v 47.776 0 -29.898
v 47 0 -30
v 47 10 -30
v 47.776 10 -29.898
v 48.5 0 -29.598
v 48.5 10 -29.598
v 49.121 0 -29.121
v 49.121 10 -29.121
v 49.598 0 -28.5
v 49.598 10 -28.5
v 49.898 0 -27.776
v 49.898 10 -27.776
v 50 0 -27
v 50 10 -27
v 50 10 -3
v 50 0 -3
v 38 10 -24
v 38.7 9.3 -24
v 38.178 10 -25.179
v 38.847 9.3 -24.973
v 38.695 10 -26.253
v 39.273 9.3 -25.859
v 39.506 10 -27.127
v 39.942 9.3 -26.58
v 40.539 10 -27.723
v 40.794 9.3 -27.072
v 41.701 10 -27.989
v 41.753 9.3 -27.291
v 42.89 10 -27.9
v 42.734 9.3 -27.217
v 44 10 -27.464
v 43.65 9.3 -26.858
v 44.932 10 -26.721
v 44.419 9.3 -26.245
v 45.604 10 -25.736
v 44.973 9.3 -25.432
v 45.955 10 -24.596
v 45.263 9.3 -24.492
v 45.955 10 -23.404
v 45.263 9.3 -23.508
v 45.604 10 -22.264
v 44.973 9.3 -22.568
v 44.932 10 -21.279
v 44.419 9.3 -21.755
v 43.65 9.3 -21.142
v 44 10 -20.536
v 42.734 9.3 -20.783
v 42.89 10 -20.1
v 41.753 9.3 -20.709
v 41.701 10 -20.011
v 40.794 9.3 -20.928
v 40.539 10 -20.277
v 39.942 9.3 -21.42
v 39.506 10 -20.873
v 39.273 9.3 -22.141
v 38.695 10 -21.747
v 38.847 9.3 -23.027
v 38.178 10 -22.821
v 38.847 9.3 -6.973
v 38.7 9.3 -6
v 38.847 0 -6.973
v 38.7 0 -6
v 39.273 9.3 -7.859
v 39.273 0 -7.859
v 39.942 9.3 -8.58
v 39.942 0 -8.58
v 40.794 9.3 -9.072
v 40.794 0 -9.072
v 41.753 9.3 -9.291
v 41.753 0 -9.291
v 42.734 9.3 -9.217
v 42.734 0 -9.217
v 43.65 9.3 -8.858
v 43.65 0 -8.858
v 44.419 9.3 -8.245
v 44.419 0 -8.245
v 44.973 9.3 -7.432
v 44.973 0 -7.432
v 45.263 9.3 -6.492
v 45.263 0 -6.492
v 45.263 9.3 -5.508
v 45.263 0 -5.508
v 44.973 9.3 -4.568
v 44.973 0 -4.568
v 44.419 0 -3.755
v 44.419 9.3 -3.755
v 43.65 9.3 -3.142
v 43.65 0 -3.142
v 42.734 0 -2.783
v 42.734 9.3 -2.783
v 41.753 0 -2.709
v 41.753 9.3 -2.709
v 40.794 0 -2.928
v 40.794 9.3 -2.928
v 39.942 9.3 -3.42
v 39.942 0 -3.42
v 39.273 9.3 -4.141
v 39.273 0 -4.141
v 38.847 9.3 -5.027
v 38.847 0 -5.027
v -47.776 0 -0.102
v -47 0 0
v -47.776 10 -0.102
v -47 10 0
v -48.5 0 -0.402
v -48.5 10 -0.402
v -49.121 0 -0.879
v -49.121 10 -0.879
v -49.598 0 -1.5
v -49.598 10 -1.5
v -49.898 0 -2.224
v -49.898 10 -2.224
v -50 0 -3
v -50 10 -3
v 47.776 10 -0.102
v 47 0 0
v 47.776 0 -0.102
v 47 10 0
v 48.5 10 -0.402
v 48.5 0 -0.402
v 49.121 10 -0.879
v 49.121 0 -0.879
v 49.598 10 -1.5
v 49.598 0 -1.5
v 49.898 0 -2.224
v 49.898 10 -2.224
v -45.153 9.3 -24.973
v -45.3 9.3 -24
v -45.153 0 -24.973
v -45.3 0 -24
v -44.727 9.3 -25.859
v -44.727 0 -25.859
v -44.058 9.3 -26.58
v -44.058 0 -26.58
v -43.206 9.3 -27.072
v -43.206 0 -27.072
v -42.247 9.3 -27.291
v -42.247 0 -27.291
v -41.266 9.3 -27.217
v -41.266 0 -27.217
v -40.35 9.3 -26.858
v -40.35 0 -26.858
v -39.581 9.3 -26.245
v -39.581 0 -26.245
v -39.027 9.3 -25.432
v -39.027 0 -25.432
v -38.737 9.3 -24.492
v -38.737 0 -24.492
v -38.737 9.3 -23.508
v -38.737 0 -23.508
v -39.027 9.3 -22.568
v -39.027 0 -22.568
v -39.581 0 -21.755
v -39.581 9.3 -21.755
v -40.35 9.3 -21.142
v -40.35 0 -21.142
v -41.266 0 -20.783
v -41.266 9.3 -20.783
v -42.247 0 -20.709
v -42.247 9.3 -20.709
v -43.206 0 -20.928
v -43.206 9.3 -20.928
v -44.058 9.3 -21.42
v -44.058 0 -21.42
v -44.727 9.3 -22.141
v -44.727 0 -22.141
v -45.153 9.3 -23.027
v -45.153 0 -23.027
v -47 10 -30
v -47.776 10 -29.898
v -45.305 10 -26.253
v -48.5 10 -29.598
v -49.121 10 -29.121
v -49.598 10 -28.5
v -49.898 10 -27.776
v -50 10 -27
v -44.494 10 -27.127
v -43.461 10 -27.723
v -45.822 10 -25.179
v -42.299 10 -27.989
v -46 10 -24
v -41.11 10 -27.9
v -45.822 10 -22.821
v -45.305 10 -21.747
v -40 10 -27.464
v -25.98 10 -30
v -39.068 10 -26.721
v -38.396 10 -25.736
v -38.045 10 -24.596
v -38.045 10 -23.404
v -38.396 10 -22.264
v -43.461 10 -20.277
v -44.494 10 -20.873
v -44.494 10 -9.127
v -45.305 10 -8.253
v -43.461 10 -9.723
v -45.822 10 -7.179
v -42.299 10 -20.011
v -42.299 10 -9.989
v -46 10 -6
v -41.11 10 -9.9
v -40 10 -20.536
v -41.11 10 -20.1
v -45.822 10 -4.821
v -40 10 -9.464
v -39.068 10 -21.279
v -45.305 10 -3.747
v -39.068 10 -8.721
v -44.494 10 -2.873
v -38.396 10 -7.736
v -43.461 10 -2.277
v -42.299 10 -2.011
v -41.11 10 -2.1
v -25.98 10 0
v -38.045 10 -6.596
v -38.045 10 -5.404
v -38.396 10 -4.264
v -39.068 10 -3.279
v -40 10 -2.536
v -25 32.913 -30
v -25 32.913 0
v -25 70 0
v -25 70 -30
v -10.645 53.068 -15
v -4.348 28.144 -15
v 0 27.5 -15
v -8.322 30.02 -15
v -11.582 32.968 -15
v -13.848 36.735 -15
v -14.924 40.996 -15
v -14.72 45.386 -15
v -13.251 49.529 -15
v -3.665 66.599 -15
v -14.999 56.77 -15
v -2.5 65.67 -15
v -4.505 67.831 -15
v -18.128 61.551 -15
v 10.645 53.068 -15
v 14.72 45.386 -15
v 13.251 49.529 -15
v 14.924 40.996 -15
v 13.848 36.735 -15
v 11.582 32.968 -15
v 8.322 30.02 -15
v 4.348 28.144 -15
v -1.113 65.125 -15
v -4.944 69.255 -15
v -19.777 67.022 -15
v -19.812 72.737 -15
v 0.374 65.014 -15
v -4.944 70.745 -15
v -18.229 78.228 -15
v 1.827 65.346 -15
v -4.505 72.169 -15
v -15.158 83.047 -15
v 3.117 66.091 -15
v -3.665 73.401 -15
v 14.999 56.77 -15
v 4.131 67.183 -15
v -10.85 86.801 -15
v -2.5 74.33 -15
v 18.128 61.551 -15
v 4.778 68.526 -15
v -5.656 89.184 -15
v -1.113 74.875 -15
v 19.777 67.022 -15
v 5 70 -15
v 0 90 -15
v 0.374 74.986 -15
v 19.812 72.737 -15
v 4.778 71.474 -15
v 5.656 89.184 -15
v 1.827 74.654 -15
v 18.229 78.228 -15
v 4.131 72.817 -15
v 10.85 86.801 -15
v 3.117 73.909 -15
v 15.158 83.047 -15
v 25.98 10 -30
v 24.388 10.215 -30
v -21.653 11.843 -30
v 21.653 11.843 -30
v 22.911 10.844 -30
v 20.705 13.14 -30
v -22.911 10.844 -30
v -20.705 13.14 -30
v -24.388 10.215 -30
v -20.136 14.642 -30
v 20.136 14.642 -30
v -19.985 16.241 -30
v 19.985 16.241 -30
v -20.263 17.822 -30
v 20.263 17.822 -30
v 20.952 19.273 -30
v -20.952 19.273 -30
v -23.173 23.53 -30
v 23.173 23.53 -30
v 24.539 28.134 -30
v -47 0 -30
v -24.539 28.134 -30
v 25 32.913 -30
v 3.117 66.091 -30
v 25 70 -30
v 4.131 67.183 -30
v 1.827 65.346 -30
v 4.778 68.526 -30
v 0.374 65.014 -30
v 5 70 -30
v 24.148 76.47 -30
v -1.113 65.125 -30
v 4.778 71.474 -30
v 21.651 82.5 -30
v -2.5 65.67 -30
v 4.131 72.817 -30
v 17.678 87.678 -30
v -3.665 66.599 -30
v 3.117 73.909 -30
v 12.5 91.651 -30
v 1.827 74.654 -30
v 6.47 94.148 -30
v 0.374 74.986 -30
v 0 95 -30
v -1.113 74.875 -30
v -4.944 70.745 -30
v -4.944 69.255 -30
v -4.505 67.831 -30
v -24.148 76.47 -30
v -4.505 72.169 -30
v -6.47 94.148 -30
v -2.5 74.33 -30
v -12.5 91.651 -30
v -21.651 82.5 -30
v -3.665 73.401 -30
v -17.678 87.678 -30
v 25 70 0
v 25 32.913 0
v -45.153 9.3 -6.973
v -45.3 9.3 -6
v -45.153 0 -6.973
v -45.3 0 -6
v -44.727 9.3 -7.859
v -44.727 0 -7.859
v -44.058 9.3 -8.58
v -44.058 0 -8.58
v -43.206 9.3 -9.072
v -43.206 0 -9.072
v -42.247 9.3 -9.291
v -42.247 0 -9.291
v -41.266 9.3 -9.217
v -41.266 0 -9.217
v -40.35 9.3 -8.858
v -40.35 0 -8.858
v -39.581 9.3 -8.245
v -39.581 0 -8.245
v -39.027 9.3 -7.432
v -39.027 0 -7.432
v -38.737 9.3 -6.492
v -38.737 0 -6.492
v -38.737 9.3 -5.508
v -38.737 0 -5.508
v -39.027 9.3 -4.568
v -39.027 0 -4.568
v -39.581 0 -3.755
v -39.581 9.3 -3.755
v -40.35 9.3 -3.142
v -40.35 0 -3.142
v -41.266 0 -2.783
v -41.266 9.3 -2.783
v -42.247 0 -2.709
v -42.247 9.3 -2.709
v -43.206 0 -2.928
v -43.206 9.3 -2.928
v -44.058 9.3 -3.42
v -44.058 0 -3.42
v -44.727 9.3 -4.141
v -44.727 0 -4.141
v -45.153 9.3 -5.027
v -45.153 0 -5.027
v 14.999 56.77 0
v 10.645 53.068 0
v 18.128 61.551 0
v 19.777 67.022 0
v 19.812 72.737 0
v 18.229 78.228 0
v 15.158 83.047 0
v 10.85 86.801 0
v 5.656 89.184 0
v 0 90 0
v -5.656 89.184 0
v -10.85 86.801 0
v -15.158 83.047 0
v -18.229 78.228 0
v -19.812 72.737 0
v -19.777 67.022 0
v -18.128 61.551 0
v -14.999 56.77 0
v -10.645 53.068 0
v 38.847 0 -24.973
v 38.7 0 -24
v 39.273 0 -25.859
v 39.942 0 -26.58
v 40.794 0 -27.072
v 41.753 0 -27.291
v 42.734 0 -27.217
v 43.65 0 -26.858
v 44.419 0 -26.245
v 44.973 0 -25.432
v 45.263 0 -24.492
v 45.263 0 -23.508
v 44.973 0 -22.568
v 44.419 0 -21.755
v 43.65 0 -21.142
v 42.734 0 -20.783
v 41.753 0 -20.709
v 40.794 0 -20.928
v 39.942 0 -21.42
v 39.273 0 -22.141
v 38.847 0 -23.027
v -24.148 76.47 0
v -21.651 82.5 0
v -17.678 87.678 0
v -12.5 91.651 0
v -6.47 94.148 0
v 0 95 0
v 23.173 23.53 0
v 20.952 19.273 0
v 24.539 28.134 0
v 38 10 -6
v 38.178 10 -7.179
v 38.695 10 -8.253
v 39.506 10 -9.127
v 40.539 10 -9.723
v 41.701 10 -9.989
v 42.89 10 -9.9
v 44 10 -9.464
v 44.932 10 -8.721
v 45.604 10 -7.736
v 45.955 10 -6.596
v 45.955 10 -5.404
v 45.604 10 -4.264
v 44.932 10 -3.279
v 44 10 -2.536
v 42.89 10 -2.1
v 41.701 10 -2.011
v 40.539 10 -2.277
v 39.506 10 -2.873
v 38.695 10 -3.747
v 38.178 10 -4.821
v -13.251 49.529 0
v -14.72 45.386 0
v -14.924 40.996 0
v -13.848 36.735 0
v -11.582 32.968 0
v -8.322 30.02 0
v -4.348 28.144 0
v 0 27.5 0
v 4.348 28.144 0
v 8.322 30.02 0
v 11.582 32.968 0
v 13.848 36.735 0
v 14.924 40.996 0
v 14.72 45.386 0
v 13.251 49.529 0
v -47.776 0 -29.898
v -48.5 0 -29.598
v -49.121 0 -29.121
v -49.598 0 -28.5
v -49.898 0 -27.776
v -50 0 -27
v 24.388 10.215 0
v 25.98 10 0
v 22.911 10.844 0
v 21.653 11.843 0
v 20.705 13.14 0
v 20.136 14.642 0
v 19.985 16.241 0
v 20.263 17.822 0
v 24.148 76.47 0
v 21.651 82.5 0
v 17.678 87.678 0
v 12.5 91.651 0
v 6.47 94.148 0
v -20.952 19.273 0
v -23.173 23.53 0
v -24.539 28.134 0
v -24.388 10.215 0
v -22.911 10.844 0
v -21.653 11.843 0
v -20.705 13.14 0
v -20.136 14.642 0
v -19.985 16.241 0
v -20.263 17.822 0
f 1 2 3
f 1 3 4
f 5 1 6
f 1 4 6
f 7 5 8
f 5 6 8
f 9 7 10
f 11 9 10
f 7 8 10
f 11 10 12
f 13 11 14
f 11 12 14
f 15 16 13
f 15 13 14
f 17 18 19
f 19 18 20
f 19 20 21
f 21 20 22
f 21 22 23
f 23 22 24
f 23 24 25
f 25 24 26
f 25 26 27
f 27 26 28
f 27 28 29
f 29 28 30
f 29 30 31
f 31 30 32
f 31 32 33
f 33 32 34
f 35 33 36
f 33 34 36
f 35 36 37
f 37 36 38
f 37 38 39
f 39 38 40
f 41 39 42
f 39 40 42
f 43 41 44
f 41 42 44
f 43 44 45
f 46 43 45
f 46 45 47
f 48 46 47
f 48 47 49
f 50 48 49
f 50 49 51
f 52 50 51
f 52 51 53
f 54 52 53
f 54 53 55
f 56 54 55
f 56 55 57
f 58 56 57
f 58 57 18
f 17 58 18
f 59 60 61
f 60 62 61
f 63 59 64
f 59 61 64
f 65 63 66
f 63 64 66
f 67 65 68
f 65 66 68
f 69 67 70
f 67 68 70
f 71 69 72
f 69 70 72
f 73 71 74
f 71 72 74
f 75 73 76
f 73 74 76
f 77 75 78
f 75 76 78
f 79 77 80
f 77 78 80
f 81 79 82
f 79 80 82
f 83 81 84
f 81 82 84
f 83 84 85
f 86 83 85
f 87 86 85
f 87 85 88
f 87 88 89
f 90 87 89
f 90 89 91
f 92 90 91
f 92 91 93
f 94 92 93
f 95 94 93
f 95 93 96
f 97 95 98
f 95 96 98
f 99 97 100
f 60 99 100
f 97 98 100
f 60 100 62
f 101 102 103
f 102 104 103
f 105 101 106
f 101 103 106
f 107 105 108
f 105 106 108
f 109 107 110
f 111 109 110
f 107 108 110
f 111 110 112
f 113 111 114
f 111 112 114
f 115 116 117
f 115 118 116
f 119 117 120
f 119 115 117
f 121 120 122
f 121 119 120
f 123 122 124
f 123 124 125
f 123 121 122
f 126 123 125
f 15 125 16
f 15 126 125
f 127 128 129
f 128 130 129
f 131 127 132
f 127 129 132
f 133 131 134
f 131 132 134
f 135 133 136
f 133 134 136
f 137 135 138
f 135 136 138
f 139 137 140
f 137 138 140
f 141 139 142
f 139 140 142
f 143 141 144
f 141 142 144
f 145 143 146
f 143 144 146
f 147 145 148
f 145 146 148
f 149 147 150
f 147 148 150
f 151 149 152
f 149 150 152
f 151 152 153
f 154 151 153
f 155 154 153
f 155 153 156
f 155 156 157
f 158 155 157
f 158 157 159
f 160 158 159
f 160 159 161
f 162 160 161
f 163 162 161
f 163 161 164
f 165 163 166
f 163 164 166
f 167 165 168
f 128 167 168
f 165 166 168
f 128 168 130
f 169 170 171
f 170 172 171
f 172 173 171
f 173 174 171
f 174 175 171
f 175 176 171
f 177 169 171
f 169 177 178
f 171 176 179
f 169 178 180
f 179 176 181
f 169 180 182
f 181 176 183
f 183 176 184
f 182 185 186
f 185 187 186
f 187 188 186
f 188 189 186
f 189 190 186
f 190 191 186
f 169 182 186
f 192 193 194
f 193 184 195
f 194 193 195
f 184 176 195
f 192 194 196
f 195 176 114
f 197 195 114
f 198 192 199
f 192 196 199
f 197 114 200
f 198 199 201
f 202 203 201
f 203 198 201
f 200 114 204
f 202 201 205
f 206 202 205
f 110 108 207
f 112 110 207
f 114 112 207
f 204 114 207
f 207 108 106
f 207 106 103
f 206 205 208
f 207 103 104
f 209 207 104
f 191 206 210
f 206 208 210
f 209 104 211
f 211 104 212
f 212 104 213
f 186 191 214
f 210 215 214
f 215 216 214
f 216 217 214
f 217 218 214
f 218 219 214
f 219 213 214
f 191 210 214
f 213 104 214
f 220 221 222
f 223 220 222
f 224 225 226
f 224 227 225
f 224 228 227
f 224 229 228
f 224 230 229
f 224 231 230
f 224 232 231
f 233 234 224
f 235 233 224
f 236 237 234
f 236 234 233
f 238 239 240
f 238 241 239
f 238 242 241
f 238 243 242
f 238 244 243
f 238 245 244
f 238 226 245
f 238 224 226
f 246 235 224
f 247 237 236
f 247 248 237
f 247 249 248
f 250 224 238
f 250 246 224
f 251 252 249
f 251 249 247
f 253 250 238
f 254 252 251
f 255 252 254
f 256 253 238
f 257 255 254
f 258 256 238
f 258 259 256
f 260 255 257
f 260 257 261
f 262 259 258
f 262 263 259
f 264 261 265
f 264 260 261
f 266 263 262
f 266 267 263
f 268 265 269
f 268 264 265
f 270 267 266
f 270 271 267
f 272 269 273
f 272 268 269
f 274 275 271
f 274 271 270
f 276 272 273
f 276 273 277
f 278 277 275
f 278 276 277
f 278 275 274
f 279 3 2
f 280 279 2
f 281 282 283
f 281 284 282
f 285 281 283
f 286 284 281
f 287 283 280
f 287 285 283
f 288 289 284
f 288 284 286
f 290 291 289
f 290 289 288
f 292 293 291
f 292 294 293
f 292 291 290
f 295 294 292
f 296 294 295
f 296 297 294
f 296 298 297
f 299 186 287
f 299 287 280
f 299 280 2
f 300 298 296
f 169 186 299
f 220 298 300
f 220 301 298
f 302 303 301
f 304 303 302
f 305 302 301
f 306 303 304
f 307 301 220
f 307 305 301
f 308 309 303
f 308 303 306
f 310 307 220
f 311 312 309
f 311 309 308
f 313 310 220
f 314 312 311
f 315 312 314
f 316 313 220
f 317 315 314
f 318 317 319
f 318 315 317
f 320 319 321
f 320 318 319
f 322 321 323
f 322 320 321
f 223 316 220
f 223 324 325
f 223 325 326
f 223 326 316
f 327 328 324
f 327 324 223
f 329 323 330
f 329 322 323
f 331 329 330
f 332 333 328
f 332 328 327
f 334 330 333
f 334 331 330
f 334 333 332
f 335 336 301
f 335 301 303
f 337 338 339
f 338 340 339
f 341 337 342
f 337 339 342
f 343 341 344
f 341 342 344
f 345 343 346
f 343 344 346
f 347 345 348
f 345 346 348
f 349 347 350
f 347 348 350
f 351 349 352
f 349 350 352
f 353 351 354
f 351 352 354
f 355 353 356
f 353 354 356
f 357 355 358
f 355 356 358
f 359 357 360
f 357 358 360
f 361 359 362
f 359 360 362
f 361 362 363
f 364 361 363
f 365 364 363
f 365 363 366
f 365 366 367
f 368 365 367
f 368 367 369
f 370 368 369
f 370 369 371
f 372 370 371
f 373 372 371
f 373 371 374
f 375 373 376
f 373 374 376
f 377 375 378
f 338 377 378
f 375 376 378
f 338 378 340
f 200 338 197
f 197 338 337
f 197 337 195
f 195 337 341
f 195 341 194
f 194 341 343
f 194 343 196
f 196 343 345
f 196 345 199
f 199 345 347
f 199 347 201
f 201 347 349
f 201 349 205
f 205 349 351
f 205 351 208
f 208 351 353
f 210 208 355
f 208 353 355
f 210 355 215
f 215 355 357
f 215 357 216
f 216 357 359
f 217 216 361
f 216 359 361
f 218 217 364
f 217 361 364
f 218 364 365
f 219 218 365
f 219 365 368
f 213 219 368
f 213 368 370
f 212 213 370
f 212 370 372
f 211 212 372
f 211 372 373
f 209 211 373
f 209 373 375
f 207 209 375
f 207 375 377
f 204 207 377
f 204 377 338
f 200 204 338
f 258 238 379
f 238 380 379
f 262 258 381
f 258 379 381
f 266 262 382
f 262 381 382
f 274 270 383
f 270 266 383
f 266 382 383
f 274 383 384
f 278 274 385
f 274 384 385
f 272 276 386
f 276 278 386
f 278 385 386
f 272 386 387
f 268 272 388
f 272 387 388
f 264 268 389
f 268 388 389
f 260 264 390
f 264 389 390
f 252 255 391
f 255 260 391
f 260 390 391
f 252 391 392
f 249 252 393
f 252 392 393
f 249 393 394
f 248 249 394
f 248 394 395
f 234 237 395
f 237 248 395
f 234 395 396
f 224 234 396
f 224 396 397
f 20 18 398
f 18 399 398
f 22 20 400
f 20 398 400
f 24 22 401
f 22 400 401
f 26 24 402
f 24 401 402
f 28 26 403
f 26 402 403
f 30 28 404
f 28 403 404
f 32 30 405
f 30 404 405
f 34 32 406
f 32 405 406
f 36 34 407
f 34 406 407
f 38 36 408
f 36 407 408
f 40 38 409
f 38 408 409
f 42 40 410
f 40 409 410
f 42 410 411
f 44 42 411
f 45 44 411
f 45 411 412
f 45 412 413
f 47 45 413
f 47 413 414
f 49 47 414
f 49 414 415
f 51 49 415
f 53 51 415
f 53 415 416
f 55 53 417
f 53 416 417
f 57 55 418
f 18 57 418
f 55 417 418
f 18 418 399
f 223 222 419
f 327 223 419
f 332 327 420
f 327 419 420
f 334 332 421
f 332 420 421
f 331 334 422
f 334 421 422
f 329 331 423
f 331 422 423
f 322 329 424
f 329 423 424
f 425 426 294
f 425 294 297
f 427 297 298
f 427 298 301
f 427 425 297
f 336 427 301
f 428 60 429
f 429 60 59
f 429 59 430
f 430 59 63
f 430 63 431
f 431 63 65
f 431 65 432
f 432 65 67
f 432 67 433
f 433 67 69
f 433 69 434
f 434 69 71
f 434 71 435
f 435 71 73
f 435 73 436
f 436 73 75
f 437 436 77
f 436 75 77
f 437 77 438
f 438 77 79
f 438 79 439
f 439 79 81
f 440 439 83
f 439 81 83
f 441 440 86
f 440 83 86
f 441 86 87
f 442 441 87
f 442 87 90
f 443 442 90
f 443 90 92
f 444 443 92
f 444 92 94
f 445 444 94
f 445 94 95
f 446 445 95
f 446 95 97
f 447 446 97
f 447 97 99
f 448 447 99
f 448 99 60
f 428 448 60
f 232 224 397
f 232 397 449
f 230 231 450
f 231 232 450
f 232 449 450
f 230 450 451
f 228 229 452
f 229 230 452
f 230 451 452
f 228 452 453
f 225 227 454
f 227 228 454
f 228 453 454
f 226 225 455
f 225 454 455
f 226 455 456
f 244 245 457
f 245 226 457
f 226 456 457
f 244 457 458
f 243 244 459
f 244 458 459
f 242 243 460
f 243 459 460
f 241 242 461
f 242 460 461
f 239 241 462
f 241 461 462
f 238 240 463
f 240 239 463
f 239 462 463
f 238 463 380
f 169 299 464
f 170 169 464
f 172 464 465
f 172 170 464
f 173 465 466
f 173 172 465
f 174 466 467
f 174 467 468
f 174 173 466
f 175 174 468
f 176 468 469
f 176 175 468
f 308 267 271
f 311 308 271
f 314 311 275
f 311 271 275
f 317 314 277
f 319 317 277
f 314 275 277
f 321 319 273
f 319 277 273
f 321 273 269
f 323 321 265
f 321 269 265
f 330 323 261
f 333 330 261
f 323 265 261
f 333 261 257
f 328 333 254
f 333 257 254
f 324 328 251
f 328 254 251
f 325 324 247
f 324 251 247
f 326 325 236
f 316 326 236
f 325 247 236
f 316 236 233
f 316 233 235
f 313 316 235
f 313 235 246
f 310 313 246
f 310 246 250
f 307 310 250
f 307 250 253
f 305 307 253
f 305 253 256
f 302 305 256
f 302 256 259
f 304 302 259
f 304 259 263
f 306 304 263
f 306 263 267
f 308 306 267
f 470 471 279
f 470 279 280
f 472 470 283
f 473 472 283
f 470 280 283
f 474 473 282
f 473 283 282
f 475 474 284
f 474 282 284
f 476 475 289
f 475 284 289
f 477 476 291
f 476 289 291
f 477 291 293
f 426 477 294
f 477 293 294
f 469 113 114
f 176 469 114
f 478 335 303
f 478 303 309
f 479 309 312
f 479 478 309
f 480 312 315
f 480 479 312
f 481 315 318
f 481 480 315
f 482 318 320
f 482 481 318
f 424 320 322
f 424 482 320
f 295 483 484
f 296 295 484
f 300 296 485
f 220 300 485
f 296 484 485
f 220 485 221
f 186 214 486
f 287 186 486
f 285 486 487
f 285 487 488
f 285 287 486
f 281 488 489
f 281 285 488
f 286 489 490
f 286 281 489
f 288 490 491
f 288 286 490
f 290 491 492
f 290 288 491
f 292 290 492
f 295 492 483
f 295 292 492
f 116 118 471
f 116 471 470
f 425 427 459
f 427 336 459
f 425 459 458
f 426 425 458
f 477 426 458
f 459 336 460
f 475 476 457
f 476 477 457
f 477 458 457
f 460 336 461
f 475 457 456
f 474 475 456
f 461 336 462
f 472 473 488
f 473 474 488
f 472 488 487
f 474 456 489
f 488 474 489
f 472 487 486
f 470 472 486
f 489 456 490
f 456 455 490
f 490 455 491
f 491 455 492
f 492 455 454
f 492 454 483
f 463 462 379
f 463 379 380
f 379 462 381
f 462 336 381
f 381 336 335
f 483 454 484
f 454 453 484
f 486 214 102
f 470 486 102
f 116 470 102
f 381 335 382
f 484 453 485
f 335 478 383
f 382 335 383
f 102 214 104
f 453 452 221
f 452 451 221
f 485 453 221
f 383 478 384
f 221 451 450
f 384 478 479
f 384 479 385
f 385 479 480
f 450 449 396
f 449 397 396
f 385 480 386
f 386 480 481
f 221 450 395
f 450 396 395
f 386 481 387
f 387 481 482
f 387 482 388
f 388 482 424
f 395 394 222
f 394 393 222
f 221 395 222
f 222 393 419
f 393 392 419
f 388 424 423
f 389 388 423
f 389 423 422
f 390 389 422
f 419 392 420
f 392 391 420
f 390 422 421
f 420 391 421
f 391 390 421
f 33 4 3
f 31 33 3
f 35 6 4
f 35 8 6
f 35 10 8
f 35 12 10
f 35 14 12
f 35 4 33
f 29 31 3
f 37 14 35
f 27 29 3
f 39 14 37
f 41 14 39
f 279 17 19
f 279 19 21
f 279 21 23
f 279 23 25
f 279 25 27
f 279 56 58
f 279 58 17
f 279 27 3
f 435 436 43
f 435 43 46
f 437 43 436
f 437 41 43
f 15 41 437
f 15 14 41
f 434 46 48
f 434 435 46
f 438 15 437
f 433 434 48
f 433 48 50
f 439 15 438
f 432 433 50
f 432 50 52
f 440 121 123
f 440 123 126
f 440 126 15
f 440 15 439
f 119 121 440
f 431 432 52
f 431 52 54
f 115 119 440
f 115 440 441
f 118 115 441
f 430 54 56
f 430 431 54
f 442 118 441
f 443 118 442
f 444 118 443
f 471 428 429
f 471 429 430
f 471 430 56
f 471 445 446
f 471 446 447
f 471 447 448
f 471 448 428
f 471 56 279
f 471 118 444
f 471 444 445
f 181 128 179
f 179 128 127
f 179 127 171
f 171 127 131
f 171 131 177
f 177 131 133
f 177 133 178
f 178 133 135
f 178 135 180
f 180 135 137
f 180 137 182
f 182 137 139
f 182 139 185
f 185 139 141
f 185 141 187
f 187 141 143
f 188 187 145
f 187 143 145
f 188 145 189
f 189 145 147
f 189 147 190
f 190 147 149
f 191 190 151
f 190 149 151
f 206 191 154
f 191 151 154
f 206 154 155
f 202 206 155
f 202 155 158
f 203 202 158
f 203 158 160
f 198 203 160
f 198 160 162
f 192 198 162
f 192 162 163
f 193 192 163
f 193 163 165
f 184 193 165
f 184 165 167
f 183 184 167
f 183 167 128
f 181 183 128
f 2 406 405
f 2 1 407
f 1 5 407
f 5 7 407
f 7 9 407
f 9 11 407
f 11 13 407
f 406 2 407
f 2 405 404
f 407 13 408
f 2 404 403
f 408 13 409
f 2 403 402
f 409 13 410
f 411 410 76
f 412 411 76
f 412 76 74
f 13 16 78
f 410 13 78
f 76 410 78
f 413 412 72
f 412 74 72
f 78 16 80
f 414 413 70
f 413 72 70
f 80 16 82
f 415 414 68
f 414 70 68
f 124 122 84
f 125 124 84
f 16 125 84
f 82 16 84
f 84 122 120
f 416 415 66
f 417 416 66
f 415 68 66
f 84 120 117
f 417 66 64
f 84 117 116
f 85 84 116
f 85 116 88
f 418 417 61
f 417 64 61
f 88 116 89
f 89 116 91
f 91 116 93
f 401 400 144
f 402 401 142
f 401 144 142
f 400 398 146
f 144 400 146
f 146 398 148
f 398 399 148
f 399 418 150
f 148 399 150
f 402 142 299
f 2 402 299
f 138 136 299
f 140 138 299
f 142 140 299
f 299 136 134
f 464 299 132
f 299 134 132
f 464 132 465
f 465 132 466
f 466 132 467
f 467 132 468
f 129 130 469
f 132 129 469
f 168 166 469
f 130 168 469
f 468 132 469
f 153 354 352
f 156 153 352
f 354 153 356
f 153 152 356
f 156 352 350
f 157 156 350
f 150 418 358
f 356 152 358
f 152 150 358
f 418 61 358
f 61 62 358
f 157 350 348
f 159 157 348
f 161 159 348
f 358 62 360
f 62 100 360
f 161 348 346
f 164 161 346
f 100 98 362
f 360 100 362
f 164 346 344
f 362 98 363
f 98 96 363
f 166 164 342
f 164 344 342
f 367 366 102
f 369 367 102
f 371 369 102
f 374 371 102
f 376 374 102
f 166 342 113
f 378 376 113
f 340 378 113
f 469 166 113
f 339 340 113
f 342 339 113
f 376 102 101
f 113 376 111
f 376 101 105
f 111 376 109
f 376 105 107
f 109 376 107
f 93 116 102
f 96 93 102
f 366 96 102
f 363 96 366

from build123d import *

# Parameters (mm, degrees)
EXTRUDE_1_DEPTH             = 30
SKETCH_5_R                  = 20
CUT_EXTRUDE_1_DEPTH         = 15
SKETCH_6_R                  = 5
CUT_EXTRUDE_2_DEPTH         = 109.397416943
FILLET_1_R                  = 6
SKETCH_7_R                  = 15
CUT_EXTRUDE_3_DEPTH         = 15
HOLE_WIZARD_M62_D           = 6.6
HOLE_WIZARD_M62_CSINK_D     = 8
HOLE_WIZARD_M62_CSINK_ANGLE = 90
PATTERN_LINEAR_1_COUNT      = 2
PATTERN_LINEAR_1_PITCH      = 18
PATTERN_LINEAR_1_COUNT_DIR2 = 2
PATTERN_LINEAR_1_PITCH_DIR2 = 84
FILLET_2_R                  = 3


with BuildPart() as part:
    # Эскиз4 → Бобышка-Вытянуть1 (new body)
    with BuildSketch(Plane.XY):
        with BuildLine():
            Line((0, 0), (50, 0))
            Line((50, 0), (50, 10))
            Line((50, 10), (10, 10))
            ThreePointArc((10, 10), (20.916500663, 19.219814537), (25, 32.912878475))
            Line((25, 32.912878475), (25, 70))
            ThreePointArc((25, 70), (17.67766953, 87.67766953), (0, 95))
            Line((0, 95), (0, 0))
        make_face()
    extrude_1 = extrude(amount=-EXTRUDE_1_DEPTH)

    # Зеркальное отражение1: Бобышка-Вытянуть1 across plane
    add(extrude_1.mirror(Plane(origin=(0, 0, -30), x_dir=(0, 0, 1), z_dir=(-1, 0, 0))))

    # Эскиз5 → Вырез-Вытянуть1 (cut)
    with BuildSketch(Plane.XY):
        with Locations((0, 70)):
            Circle(SKETCH_5_R)
    extrude(amount=-CUT_EXTRUDE_1_DEPTH, mode=Mode.SUBTRACT)

    # Эскиз6 → Вырез-Вытянуть2 (cut, through all)
    with BuildSketch(Plane.XY.offset(-15)):
        with Locations((0, 70)):
            Circle(SKETCH_6_R)
    extrude(amount=-CUT_EXTRUDE_2_DEPTH, mode=Mode.SUBTRACT)

    # Скругление1
    fillet_1_edges = [part.edges().sort_by_distance(p)[0] for p in [
        (10, 10, -15),
        (-10, 10, -15),
    ]]
    fillet(fillet_1_edges, radius=FILLET_1_R)

    # Эскиз7 → Вырез-Вытянуть3 (cut)
    with BuildSketch(Plane.XY):
        with Locations((0, 42.5)):
            Circle(SKETCH_7_R)
    extrude(amount=-CUT_EXTRUDE_3_DEPTH, mode=Mode.SUBTRACT)

    # Зенковка для винта с полупотайной головкой M62 (through all)
    with Locations(Plane(origin=(42, 10, -24), x_dir=(1, 0, 0), z_dir=(0, 1, 0))):
        with Locations((0, 0)):
            hole_wizard_m62 = CounterSinkHole(HOLE_WIZARD_M62_D / 2, HOLE_WIZARD_M62_CSINK_D / 2, counter_sink_angle=HOLE_WIZARD_M62_CSINK_ANGLE)

    # Линейный массив1: Hole Wizard M62 2 × 2
    with Locations(*[(-j * PATTERN_LINEAR_1_PITCH_DIR2, 0, i * PATTERN_LINEAR_1_PITCH) for i in range(PATTERN_LINEAR_1_COUNT) for j in range(PATTERN_LINEAR_1_COUNT_DIR2) if (i, j) != (0, 0)]):
        add(hole_wizard_m62, mode=Mode.SUBTRACT)

    # Скругление2
    fillet_2_edges = [part.edges().sort_by_distance(p)[0] for p in [
        (50, 5, -30),
        (-50, 5, 0),
        (-50, 5, -30),
        (50, 5, 0),
    ]]
    fillet(fillet_2_edges, radius=FILLET_2_R)


solid = part.part
